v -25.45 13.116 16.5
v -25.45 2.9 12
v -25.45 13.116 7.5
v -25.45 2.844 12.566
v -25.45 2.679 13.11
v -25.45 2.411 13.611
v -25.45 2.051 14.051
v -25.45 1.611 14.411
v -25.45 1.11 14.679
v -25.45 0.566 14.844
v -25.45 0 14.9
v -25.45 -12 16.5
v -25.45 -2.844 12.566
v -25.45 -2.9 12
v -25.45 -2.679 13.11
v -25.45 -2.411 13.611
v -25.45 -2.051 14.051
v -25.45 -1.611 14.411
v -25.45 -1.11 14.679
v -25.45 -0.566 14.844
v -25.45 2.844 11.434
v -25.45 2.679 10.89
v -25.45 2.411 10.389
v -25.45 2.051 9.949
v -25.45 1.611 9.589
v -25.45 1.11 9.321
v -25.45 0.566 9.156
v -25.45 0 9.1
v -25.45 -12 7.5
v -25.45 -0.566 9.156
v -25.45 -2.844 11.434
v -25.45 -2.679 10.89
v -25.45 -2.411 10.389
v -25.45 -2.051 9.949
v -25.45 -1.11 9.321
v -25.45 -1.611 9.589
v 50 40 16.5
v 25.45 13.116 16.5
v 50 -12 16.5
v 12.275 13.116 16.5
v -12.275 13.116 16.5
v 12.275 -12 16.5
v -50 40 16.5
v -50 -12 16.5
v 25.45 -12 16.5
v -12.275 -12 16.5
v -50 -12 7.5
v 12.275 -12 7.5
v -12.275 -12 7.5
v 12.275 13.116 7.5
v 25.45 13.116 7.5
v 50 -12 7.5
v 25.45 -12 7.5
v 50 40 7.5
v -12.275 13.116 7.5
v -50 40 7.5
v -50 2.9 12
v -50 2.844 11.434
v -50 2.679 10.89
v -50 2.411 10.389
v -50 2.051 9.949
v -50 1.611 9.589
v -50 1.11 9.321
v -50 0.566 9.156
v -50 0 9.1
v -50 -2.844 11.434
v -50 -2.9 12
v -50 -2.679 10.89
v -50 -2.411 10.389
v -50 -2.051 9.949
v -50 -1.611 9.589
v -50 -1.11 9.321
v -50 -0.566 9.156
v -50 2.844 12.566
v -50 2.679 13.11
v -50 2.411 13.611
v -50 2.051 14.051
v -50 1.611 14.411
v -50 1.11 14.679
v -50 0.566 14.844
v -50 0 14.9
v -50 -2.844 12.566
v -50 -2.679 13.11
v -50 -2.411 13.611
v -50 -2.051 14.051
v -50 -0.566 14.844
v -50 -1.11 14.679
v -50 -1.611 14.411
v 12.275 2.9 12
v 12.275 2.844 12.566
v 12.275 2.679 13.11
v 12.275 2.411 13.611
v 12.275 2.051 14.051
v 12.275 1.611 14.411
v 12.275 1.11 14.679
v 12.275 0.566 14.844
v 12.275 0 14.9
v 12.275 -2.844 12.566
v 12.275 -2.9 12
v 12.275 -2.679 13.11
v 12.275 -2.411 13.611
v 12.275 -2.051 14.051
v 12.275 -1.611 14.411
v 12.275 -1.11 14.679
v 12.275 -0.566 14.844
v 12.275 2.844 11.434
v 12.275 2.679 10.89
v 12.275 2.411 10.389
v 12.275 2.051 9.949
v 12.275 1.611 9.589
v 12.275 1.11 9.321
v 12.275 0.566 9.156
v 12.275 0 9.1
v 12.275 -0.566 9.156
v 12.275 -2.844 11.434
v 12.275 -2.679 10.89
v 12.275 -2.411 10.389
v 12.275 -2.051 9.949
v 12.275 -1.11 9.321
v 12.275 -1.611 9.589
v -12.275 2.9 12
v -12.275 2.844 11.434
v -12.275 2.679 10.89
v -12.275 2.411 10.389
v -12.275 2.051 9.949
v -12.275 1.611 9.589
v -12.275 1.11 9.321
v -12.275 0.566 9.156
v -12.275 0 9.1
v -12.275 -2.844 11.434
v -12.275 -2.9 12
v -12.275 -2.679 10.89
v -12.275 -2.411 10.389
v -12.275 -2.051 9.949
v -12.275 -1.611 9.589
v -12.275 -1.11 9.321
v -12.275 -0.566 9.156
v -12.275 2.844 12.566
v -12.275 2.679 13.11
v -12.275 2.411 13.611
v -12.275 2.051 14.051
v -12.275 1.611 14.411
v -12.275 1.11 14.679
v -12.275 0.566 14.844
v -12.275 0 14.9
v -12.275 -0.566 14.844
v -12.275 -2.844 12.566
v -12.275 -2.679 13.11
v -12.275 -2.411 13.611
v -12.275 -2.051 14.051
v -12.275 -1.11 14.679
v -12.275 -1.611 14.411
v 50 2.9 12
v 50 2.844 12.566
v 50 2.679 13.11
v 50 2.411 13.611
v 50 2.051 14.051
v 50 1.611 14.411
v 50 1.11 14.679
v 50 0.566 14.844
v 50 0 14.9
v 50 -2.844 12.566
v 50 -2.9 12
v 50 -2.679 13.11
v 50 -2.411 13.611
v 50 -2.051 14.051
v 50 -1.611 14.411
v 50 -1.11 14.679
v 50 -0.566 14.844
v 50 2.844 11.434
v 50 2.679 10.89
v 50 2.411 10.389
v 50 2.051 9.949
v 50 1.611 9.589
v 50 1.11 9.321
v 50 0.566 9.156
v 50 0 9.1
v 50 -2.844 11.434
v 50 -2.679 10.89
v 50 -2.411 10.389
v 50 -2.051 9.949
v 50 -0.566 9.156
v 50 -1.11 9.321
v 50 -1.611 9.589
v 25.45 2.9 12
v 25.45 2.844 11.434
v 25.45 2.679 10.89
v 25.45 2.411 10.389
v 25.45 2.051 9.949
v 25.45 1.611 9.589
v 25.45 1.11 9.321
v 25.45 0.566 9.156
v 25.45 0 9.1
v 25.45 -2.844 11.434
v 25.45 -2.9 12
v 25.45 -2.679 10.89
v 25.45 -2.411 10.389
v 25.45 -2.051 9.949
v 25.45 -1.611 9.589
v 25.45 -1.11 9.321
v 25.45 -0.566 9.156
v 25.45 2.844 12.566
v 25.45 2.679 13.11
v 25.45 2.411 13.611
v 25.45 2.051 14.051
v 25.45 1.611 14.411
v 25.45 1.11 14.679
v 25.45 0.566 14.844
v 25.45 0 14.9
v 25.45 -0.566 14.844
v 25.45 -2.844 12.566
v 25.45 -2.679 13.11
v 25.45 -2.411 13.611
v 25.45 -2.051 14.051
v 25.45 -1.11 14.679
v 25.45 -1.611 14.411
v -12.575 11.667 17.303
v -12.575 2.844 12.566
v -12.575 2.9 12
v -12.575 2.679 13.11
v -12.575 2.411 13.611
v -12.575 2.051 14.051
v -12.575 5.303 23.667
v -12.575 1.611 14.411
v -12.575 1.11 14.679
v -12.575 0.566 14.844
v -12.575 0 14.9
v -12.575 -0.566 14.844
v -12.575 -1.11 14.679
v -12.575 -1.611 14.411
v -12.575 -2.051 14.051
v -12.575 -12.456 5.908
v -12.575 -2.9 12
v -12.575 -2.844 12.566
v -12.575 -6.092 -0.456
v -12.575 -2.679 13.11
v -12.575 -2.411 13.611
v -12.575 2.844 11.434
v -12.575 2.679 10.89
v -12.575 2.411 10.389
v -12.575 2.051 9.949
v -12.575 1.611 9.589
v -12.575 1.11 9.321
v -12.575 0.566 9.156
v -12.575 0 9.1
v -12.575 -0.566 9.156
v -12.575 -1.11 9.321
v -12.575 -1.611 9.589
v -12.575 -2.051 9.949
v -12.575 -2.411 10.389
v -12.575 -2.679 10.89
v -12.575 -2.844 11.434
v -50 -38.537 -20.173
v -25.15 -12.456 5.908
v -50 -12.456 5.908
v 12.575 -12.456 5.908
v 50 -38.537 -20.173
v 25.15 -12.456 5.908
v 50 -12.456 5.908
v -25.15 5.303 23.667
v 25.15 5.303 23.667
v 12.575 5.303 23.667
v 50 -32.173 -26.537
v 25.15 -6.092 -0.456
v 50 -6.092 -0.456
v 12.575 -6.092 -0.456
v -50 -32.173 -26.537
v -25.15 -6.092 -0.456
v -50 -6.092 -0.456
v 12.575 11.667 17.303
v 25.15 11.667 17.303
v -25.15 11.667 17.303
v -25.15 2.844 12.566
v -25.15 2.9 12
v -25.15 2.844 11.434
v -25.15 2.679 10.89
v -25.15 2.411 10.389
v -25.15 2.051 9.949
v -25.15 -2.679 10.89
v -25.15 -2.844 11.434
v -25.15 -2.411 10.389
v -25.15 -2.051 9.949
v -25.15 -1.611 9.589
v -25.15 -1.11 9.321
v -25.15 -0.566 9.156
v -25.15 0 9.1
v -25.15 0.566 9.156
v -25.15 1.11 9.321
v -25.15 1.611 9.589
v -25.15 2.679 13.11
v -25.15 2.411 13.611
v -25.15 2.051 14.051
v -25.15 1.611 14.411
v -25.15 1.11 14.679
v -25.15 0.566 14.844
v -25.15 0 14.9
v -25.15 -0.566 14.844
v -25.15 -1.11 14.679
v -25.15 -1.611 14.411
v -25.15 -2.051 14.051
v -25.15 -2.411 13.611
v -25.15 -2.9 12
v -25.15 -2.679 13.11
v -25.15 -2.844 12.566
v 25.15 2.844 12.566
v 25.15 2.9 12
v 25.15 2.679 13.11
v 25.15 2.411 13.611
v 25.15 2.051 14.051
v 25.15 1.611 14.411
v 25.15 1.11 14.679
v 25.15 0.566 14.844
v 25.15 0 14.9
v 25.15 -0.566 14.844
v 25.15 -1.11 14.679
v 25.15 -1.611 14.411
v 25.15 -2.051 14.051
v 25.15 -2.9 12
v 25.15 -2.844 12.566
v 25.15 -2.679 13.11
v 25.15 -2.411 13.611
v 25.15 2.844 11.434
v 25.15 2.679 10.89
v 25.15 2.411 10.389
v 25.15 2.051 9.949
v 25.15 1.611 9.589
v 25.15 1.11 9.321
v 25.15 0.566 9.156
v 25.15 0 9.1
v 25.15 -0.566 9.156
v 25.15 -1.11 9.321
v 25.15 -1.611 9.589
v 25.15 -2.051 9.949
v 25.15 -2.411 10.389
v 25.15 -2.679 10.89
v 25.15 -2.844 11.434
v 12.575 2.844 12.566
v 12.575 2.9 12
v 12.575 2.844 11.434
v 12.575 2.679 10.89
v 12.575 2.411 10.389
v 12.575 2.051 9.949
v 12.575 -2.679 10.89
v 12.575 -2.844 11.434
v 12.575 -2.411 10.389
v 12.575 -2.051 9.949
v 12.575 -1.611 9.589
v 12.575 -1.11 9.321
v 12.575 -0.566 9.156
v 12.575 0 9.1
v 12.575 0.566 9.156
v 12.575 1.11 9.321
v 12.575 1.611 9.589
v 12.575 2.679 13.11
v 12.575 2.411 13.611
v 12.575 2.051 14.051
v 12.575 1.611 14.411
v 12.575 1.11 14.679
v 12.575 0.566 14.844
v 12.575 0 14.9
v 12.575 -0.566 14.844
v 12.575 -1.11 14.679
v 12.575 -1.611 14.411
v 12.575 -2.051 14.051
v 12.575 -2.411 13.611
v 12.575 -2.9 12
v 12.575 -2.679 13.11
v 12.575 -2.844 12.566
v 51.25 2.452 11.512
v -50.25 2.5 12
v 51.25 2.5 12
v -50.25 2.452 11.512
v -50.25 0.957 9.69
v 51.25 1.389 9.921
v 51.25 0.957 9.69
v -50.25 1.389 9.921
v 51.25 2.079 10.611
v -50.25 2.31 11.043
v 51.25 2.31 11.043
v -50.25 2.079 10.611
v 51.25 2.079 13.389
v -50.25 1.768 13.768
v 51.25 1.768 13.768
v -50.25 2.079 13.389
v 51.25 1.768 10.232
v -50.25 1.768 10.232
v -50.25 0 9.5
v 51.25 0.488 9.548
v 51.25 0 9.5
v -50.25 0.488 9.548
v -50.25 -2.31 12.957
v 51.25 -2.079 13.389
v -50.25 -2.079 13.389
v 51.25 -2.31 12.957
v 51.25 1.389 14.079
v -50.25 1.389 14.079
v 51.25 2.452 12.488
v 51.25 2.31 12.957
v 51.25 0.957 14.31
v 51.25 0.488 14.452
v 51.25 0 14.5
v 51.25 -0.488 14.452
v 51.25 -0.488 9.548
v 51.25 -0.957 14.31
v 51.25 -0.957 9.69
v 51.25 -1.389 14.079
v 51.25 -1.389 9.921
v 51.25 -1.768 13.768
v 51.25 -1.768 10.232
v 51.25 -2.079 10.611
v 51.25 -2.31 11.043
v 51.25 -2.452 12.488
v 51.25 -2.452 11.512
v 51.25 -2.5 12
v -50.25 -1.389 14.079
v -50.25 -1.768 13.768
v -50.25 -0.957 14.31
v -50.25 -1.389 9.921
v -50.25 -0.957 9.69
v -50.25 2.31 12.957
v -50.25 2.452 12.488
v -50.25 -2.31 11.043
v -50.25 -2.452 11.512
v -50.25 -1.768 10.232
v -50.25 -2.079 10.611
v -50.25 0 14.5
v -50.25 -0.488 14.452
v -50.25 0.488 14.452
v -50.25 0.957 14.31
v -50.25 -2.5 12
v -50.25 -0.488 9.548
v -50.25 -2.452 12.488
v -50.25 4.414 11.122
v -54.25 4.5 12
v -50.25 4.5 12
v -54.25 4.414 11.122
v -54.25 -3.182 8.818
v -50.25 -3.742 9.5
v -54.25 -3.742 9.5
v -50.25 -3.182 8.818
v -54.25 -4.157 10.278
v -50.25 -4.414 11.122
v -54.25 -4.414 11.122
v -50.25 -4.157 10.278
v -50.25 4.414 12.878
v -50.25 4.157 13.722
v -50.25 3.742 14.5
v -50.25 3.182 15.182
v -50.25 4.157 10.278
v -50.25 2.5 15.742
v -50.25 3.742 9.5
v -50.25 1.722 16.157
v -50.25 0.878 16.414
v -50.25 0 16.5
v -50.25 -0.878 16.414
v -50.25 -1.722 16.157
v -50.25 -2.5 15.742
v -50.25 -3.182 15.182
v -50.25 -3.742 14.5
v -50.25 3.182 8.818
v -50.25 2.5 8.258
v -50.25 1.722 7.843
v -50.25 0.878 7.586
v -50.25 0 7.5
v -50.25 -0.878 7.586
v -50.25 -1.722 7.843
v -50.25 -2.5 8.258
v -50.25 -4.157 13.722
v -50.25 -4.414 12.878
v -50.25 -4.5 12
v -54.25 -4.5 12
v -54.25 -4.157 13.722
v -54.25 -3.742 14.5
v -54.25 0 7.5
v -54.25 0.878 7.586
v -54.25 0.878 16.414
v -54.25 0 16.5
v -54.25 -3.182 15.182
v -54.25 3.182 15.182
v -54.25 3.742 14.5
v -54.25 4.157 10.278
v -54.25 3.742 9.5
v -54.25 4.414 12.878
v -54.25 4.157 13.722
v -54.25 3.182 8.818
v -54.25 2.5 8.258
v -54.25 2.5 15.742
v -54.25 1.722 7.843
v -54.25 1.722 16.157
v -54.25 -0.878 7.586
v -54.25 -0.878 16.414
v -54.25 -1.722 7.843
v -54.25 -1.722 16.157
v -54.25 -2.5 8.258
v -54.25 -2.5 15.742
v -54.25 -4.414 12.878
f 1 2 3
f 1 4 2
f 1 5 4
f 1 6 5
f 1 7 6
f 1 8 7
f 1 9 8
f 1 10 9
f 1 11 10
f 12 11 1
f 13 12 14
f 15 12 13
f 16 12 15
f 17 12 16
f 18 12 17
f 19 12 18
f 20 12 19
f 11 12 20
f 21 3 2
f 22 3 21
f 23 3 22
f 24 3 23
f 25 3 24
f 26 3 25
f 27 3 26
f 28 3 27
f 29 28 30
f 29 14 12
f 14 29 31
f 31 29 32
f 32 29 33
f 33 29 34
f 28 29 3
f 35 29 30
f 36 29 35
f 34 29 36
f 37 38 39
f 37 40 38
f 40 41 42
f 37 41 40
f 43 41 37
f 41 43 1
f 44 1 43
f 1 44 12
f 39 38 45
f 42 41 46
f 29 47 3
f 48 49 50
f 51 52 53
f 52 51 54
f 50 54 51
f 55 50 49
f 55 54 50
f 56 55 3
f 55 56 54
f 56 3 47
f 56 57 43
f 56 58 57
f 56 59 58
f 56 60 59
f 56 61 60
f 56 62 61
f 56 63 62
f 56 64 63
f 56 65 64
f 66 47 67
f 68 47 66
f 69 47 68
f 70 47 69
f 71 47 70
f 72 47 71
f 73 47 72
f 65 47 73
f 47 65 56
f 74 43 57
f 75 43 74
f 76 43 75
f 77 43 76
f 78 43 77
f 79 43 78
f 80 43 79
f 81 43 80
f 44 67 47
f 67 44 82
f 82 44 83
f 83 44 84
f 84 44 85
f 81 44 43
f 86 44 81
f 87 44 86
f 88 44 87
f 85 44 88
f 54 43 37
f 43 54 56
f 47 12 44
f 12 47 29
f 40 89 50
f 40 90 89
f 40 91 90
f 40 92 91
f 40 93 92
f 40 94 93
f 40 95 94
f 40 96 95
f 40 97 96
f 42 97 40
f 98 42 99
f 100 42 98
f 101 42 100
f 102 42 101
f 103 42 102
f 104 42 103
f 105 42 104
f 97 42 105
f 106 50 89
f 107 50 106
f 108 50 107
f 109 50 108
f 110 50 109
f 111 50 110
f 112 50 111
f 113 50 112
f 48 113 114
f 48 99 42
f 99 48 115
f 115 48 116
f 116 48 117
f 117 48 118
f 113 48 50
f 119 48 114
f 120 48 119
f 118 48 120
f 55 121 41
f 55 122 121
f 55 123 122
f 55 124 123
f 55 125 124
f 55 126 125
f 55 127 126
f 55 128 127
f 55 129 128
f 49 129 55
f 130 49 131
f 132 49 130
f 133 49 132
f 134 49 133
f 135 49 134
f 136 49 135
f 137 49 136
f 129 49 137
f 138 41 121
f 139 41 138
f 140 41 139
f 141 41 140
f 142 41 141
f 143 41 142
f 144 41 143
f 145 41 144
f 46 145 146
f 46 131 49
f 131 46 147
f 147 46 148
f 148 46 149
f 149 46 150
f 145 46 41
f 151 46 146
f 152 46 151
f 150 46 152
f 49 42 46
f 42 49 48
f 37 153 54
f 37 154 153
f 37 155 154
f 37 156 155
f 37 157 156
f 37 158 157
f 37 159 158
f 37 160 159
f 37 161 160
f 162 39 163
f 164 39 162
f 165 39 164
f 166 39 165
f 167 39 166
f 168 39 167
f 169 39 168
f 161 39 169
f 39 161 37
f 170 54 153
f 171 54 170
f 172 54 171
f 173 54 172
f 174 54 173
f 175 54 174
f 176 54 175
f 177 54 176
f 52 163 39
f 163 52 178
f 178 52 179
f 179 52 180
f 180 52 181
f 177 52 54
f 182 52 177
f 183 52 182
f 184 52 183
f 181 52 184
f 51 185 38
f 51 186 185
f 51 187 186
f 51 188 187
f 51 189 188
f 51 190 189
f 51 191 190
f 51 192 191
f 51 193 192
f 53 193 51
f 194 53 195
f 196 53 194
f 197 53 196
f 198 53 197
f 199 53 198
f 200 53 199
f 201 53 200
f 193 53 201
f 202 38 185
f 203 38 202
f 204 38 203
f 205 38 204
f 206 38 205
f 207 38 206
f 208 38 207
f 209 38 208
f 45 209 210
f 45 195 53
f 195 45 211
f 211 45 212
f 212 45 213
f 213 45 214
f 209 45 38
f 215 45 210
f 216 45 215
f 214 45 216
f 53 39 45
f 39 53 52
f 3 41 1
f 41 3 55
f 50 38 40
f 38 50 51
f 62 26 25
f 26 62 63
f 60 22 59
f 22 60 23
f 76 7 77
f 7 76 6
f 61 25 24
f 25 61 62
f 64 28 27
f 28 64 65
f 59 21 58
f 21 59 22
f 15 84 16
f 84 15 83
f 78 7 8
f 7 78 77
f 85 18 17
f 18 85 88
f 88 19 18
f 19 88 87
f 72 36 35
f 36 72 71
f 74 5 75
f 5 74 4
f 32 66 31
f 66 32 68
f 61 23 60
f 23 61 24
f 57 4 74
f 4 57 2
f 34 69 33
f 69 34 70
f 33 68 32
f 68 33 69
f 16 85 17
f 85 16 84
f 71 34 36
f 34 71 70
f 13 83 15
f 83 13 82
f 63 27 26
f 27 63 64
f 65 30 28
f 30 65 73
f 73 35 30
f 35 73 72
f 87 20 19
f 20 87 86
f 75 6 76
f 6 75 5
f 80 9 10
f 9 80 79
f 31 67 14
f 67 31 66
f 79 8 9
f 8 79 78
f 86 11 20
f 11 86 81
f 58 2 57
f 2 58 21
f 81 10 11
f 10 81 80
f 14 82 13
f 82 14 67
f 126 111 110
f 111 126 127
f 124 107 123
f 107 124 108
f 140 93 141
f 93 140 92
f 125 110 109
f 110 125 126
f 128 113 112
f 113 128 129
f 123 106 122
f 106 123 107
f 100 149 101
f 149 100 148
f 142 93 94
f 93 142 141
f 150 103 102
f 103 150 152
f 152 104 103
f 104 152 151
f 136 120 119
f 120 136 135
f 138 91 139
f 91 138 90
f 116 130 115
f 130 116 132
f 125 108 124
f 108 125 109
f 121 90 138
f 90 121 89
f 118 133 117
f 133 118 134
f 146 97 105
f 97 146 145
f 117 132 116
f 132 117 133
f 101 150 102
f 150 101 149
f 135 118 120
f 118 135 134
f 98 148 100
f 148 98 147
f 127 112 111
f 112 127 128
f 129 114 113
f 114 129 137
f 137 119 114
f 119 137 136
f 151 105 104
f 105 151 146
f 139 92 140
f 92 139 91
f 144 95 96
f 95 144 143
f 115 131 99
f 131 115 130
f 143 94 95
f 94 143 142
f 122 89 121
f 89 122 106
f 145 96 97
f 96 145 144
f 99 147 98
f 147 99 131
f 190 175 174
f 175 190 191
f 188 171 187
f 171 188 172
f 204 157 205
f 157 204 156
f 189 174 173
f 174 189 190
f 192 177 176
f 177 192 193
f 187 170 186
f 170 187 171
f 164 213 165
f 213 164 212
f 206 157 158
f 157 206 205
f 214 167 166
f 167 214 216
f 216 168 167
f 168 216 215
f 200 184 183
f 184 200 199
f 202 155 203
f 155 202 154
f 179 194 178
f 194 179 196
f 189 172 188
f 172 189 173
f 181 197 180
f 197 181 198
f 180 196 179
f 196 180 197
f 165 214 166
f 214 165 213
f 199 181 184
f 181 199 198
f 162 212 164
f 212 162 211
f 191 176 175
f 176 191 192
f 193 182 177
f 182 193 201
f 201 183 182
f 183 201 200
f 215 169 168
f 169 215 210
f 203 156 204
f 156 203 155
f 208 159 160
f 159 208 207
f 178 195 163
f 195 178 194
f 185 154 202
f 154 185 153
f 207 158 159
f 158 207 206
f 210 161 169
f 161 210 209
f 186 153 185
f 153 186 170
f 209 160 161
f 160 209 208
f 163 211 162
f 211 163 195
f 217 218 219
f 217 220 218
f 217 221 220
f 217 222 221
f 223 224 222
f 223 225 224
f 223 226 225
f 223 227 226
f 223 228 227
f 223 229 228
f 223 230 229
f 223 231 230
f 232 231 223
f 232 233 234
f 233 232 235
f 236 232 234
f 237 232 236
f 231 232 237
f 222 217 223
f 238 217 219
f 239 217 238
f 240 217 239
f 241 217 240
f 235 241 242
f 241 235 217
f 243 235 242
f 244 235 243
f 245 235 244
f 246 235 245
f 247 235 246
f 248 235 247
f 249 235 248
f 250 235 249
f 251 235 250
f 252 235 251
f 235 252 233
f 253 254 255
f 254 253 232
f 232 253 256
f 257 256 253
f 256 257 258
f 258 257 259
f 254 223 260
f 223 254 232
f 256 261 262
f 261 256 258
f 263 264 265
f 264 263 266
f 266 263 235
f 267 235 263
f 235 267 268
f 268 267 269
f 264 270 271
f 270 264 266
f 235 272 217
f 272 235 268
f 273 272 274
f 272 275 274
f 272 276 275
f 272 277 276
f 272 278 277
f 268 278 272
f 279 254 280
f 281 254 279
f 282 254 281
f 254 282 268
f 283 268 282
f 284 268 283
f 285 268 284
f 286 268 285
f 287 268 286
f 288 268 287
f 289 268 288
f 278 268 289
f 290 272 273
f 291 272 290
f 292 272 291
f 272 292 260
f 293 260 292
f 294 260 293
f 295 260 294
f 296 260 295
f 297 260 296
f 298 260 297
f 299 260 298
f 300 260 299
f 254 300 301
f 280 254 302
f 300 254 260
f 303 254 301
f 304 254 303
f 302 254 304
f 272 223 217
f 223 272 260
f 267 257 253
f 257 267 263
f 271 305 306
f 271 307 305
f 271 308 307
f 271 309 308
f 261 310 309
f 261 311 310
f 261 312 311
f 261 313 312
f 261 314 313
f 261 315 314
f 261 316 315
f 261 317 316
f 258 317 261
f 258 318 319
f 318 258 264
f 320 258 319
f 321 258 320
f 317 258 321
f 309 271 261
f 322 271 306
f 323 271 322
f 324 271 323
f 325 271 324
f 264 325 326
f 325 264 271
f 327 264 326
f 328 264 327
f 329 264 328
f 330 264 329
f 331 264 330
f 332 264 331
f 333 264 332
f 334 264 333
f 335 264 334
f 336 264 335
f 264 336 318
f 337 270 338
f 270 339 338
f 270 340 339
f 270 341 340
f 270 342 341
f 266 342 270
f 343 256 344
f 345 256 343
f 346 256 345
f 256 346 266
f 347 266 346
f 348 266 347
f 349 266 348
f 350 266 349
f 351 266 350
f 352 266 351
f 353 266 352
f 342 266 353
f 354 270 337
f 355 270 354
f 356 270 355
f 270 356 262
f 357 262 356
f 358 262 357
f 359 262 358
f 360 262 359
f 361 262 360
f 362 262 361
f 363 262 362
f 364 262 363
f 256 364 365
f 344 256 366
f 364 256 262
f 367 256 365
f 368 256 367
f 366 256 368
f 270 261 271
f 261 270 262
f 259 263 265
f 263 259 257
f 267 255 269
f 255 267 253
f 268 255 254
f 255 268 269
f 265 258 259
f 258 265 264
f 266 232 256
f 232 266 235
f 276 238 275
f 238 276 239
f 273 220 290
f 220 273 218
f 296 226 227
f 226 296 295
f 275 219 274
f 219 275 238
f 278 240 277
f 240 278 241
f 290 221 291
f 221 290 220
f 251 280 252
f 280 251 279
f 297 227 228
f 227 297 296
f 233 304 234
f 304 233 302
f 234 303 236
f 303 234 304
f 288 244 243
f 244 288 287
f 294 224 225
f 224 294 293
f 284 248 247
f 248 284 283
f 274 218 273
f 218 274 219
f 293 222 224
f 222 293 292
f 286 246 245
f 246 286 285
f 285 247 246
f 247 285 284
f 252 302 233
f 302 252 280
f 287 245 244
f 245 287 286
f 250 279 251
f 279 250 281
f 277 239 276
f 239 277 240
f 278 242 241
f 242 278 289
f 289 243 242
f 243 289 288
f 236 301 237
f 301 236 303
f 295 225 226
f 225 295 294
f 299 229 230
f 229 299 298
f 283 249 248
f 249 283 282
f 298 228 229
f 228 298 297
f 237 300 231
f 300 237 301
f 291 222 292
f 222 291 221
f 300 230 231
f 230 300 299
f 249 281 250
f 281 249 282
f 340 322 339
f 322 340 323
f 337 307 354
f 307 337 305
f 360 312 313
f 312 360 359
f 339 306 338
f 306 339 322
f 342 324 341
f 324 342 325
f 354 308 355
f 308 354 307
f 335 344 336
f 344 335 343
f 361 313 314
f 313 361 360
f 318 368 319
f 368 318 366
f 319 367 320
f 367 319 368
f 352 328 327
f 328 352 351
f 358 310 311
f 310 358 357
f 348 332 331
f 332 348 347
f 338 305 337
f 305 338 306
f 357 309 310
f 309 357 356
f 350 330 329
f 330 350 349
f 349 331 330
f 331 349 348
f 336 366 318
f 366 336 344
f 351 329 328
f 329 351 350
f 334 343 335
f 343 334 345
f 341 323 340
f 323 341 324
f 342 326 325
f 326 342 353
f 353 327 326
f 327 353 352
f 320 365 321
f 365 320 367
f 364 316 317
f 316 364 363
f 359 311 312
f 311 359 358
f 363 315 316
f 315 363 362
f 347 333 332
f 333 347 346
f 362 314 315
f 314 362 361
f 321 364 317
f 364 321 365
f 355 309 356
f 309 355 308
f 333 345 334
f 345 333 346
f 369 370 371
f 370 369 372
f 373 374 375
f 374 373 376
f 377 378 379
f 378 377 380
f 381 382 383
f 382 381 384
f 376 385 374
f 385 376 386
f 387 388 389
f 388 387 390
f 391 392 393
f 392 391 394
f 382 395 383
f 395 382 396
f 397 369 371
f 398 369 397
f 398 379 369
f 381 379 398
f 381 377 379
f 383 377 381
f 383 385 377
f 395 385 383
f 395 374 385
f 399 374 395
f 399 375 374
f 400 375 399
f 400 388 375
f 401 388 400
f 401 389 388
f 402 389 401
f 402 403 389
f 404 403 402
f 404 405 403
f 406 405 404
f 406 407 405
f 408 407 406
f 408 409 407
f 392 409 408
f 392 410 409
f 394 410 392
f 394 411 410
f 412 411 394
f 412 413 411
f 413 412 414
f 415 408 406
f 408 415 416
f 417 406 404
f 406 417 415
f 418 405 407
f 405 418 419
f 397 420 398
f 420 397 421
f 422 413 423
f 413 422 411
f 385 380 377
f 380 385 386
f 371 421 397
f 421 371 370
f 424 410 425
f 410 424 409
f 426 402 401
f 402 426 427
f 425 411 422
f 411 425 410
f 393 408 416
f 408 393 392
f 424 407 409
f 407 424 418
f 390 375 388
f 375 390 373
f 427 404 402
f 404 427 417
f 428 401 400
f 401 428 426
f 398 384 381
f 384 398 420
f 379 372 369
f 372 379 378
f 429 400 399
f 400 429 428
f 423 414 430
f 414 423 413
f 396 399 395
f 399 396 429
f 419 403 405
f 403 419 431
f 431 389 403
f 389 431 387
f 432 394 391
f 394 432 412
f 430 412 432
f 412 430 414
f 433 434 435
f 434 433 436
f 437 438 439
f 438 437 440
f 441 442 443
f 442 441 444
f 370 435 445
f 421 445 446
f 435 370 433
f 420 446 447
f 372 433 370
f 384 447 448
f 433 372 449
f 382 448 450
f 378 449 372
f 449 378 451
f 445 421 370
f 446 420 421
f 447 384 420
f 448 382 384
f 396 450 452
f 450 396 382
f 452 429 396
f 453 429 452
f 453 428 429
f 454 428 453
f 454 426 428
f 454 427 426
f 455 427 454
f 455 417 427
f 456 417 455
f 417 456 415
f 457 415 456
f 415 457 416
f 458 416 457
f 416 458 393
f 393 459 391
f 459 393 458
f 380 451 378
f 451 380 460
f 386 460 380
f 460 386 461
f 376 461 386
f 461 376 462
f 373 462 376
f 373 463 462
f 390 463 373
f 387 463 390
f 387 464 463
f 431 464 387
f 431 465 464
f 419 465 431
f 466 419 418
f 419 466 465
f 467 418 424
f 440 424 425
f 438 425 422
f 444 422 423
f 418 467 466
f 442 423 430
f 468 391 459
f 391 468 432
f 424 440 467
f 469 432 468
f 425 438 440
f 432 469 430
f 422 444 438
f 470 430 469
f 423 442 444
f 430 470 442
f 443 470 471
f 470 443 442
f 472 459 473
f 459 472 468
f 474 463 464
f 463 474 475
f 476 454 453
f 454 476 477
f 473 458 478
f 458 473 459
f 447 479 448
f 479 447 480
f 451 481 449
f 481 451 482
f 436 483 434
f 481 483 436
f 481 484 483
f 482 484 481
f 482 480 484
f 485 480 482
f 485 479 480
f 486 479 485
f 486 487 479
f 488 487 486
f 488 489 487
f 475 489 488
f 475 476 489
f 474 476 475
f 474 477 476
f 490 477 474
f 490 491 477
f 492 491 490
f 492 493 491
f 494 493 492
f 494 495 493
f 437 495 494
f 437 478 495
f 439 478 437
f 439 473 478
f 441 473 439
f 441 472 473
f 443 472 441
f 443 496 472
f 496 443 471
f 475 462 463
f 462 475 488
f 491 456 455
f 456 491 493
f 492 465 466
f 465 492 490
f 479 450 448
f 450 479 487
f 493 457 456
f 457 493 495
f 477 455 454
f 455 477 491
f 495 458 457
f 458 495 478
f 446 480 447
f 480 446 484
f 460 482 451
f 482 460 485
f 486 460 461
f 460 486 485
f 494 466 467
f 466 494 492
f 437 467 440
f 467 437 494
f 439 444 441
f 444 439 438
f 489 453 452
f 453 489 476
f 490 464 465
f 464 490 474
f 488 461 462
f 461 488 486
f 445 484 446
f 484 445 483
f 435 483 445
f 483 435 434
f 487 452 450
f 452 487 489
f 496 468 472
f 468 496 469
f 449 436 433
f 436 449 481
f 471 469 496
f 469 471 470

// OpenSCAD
$fn = 32;

// ------------------------------------------------------------------------
// Butt hinge: hinge 100 mm, leaf swung 45 deg
// Every part is its own module, assembly() places every instance.
// ------------------------------------------------------------------------

// --- part 1 ---
module hinge_base() {
  difference() {
    union() {
      translate([-50, -12, -4.5]) cube([24.55, 52, 9]);
      translate([-12.275, -12, -4.5]) cube([24.55, 52, 9]);
      translate([25.45, -12, -4.5]) cube([24.55, 52, 9]);
      translate([-50, 13.116, -4.5]) cube([100, 26.884, 9]);
    }
    translate([-37.725, 0, 0]) rotate([0, 90, 0]) cylinder(h = 26.55, d = 5.8, center = true);
    translate([0, 0, 0]) rotate([0, 90, 0]) cylinder(h = 26.55, d = 5.8, center = true);
    translate([37.725, 0, 0]) rotate([0, 90, 0]) cylinder(h = 26.55, d = 5.8, center = true);
  }
}

// --- part 2 ---
module hinge_mover() {
  difference() {
    union() {
      translate([-25.15, -50, -4.5]) cube([12.575, 62, 9]);
      translate([12.575, -50, -4.5]) cube([12.575, 62, 9]);
      translate([-50, -50, -4.5]) cube([100, 36.884, 9]);
    }
    translate([-18.863, 0, 0]) rotate([0, 90, 0]) cylinder(h = 14.575, d = 5.8, center = true);
    translate([18.863, 0, 0]) rotate([0, 90, 0]) cylinder(h = 14.575, d = 5.8, center = true);
  }
}

// --- part 3 ---
module hinge_pin() {
  rotate([0, 90, 0]) cylinder(h = 102.5, d = 5, center = true);
  translate([-54.25, 0, 0]) rotate([0, 90, 0]) cylinder(h = 4, d = 9);
}

// --- assembly ---
module assembly() {
  color([0.80, 0.24, 0.20]) translate([0, 0, 12]) rotate([0, 0, 0]) hinge_base();
  color([0.20, 0.45, 0.75]) translate([0, 0, 12]) rotate([45, 0, 0]) hinge_mover();
  color([0.25, 0.62, 0.32]) translate([0, 0, 12]) rotate([0, 0, 0]) hinge_pin();
}

assembly();
